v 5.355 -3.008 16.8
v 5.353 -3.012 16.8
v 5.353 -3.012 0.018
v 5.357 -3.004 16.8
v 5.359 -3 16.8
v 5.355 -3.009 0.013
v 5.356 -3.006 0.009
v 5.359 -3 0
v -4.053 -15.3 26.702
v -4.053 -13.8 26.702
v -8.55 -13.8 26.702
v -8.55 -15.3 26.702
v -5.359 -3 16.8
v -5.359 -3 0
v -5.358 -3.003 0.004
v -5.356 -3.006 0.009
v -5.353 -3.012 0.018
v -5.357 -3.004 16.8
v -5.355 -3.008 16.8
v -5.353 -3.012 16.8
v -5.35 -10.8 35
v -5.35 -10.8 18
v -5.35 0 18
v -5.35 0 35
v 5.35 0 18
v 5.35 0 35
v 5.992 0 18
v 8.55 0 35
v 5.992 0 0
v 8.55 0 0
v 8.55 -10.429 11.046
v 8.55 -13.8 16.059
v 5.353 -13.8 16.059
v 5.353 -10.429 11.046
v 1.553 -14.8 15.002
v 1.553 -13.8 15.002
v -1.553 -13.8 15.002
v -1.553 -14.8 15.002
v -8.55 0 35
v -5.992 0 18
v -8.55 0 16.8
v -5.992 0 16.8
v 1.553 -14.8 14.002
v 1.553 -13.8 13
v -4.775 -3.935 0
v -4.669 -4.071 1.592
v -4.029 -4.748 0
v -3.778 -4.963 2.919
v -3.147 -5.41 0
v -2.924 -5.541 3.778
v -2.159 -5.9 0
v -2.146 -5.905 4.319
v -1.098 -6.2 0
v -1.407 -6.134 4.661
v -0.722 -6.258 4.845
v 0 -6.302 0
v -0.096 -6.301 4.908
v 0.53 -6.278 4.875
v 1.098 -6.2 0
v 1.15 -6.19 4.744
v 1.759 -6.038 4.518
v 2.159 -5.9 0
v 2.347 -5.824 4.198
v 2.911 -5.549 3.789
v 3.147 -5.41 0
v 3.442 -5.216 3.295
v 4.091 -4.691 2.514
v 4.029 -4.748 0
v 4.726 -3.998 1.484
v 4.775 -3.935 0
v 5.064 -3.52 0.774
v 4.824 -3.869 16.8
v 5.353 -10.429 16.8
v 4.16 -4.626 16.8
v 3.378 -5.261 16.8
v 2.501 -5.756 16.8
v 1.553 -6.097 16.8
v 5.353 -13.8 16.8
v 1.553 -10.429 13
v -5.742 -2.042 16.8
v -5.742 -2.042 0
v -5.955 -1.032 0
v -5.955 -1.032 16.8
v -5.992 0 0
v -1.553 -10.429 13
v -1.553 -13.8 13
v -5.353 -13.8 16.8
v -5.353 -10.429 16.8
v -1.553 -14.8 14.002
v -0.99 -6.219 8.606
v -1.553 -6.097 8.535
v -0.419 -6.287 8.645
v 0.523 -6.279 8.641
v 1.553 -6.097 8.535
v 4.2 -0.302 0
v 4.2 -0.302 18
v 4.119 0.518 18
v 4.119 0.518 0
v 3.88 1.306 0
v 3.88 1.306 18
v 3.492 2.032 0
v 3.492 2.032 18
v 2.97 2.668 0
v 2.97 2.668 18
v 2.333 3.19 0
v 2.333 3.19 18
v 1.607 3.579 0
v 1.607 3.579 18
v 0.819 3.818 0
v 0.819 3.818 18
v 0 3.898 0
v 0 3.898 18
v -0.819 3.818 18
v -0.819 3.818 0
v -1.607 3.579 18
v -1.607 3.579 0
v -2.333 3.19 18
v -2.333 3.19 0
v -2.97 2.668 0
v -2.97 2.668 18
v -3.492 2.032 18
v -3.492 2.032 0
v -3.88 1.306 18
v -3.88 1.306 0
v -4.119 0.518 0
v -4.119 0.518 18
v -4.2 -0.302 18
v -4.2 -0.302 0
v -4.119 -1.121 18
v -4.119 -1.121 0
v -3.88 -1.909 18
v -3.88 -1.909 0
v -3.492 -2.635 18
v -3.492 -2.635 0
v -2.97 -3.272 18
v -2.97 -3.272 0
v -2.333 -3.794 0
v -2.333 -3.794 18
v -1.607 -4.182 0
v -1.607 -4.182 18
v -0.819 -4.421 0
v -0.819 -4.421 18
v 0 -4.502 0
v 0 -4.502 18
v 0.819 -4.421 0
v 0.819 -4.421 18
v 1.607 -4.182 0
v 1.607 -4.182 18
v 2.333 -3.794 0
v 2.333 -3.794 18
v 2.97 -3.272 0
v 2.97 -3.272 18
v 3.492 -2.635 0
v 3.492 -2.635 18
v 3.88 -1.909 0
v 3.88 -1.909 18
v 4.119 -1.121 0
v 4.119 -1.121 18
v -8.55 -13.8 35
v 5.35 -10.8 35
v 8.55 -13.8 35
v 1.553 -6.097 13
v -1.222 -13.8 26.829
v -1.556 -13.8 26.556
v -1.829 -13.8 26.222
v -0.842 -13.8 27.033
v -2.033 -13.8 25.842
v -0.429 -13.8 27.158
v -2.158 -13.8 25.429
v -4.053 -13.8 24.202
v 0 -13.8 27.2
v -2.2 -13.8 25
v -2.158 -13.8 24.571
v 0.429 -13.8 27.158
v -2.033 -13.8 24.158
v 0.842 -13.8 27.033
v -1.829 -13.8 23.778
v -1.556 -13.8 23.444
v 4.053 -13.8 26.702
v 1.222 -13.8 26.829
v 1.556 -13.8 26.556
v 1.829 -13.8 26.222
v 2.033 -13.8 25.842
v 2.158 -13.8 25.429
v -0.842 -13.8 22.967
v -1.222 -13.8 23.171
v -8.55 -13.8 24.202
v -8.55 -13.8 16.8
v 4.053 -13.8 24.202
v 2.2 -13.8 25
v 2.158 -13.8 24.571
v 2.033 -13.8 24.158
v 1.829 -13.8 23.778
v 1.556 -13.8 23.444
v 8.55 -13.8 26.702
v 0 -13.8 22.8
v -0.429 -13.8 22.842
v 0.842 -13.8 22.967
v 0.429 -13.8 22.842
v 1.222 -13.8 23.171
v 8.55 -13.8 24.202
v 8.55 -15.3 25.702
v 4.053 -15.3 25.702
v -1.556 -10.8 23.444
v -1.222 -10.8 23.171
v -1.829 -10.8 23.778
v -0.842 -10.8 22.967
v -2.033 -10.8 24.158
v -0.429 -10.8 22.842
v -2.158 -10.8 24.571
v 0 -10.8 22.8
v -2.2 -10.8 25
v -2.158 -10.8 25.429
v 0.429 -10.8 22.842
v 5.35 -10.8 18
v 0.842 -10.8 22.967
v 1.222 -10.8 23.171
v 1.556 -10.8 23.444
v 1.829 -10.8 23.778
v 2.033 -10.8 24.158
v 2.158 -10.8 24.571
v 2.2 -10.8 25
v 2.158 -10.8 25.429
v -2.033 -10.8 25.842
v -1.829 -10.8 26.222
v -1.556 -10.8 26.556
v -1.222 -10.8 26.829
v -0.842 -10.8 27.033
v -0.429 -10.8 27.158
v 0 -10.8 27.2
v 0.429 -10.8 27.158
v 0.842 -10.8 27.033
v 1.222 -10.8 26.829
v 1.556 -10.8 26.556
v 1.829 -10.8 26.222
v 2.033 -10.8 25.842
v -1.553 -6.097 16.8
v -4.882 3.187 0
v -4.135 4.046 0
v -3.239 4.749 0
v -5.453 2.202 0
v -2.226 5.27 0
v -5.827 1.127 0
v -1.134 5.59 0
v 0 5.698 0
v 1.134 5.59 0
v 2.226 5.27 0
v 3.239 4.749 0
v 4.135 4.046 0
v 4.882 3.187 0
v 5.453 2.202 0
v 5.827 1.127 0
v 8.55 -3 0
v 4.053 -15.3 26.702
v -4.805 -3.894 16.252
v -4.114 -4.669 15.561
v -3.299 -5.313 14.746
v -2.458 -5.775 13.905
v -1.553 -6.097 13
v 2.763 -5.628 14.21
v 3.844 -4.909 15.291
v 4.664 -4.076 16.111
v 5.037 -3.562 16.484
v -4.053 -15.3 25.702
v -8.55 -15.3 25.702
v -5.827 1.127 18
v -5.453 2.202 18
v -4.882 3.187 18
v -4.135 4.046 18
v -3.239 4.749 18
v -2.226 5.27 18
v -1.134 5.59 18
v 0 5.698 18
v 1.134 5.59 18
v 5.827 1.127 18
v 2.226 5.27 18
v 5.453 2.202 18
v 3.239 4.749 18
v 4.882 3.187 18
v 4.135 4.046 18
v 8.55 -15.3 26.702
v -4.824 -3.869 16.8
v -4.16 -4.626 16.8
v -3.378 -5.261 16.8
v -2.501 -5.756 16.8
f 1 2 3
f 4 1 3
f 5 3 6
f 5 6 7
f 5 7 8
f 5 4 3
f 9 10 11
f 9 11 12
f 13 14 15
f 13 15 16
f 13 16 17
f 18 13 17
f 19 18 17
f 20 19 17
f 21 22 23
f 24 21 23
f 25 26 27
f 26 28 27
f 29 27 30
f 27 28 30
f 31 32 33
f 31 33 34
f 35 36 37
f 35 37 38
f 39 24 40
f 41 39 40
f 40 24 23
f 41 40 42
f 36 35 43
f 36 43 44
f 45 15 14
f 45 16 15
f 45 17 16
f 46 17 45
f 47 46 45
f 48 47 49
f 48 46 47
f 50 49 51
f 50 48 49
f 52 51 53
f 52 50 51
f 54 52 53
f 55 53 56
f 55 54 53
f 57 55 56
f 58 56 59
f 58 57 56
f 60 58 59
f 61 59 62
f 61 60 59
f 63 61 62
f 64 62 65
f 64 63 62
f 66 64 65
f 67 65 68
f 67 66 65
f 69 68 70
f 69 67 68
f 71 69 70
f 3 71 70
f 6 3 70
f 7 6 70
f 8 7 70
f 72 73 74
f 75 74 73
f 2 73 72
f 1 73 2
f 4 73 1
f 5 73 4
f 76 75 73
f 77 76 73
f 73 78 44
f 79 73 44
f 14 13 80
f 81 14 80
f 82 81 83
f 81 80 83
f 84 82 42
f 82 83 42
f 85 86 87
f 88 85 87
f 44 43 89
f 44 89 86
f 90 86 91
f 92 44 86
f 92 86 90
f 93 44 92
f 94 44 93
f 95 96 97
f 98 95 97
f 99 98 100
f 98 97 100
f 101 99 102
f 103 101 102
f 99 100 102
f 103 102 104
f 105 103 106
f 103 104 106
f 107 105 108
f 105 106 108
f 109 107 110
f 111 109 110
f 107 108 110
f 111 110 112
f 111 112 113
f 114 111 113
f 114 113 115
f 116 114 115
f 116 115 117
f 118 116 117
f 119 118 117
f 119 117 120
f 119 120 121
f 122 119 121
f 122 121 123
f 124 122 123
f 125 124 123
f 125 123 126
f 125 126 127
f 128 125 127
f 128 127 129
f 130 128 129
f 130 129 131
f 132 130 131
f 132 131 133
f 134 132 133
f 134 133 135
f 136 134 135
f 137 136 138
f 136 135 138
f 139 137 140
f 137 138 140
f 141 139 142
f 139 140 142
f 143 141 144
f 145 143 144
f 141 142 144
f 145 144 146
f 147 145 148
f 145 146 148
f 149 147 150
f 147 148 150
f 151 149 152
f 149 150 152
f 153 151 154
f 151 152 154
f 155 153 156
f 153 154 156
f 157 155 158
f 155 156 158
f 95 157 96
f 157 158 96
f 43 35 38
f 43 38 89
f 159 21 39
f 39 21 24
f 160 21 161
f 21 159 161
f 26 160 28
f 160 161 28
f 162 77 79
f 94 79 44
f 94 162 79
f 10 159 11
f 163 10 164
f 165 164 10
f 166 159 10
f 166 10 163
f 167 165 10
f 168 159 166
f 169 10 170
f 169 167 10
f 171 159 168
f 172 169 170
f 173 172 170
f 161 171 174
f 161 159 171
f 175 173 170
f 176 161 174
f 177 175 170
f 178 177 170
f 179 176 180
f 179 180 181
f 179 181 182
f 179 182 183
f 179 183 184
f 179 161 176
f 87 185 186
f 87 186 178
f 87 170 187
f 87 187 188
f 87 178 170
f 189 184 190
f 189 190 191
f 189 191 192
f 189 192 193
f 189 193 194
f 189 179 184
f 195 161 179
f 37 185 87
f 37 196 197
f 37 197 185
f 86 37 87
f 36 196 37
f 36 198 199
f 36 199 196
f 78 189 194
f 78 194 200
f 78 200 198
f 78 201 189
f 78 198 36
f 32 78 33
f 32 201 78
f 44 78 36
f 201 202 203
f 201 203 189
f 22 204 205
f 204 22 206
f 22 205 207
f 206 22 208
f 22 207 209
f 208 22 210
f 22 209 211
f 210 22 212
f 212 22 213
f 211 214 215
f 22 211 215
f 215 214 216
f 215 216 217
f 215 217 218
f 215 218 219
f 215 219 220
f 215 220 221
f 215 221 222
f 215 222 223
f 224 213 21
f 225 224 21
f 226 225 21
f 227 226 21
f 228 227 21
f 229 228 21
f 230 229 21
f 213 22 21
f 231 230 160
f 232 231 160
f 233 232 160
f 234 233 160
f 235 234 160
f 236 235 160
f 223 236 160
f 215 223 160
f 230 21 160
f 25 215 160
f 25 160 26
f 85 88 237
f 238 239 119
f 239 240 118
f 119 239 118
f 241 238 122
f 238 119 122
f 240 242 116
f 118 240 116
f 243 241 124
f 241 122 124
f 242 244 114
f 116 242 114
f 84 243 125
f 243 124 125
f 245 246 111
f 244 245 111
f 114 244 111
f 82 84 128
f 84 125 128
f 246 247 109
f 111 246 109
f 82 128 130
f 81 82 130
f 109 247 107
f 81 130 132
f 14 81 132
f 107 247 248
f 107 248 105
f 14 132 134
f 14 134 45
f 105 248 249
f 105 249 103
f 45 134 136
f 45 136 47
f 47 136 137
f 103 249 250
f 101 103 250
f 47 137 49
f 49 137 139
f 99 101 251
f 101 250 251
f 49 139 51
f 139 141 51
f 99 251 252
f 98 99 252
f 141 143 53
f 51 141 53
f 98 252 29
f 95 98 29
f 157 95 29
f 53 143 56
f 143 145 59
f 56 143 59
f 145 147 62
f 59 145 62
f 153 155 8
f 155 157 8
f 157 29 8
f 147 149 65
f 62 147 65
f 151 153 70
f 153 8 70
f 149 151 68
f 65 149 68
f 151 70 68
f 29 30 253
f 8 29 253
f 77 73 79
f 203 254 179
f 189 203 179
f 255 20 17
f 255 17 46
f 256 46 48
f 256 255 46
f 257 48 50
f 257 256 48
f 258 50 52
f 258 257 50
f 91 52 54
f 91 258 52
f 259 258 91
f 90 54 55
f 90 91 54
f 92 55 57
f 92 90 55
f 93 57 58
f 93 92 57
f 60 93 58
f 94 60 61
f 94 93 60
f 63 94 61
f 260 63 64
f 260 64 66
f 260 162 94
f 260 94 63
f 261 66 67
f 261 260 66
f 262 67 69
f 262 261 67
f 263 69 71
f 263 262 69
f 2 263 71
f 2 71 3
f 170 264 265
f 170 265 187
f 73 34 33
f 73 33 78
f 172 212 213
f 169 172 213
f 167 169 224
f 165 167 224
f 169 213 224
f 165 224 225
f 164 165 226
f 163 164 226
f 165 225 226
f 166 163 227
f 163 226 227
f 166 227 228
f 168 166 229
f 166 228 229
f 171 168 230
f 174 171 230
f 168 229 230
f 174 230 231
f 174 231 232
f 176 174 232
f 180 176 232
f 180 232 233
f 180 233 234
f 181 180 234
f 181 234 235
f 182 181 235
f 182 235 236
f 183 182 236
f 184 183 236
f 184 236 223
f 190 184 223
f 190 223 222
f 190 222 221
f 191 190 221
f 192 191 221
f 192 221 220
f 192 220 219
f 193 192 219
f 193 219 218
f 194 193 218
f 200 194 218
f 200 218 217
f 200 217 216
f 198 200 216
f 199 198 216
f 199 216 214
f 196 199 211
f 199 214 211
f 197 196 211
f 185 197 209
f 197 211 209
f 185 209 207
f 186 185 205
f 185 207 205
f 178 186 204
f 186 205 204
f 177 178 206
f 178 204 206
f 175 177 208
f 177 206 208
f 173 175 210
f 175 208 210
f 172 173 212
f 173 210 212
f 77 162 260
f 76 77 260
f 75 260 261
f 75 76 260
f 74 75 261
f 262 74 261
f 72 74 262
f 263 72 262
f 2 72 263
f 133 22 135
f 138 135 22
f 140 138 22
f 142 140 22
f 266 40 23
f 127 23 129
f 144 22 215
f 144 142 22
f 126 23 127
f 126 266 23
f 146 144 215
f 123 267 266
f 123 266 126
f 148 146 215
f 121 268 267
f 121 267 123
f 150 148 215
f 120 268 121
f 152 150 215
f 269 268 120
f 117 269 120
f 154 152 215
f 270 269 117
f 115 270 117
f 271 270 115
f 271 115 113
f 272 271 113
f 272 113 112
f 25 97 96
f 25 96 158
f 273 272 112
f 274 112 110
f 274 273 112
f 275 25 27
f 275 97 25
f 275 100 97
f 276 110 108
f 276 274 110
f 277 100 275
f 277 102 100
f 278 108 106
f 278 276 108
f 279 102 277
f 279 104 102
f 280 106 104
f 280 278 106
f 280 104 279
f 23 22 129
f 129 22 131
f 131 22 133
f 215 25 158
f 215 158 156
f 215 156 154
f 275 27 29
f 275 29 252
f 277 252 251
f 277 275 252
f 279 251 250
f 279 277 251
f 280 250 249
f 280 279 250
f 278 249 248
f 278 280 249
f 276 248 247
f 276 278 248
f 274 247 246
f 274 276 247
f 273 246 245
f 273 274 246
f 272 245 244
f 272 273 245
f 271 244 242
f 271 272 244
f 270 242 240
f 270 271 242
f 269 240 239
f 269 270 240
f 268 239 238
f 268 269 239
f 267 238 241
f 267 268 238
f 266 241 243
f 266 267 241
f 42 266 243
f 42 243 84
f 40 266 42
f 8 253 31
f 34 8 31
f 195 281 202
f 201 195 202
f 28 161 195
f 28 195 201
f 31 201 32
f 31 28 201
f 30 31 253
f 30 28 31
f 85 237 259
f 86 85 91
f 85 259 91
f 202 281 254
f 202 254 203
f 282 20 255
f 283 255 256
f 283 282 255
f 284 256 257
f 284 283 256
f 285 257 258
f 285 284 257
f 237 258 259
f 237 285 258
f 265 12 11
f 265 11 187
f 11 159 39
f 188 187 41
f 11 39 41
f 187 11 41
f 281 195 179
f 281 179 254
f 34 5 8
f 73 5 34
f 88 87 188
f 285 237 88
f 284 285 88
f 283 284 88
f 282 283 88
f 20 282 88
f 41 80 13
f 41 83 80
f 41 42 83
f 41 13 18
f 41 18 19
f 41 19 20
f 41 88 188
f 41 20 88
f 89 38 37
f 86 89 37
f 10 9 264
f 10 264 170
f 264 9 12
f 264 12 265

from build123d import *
from build123d.topology import SkipClean

# Parameters (mm, degrees)
BOSS_EXTRUDE1_DEPTH     = 8.55
SKETCH2_W               = 10.7
SKETCH2_H               = 10.8
CUT_EXTRUDE1_DEPTH      = 17
SKETCH3_R               = 6
BOSS_EXTRUDE2_DEPTH     = 18
SKETCH4_R               = 4.2
CUT_EXTRUDE2_DEPTH      = 25.239275979
BOSS_EXTRUDE5_DEPTH     = 17.1
SKETCH7_R               = 2.2
CUT_EXTRUDE3_DEPTH      = 40.626944786
CUT_EXTRUDE4_REACH      = 33.94
SKETCH10_W              = 8.106
SKETCH10_H              = 1.5
SKETCH11_W              = 6.997
SKETCH11_H              = 1
CUT_EXTRUDE5_DEPTH      = 27.591587091
CUT_EXTRUDE6_REACH      = 42.967
CUT_EXTRUDE6_END_RADIUS = 6
CUT_EXTRUDE7_START      = -16.8
CUT_EXTRUDE7_DEPTH      = 16.8
BOSS_EXTRUDE6_DEPTH     = 1.553
BOSS_EXTRUDE7_REACH     = 36.128
CUT_EXTRUDE8_START      = -16.8
CUT_EXTRUDE8_DEPTH      = 16.8
CUT_EXTRUDE9_REACH      = 43.851


with BuildPart() as part:
    # Sketch1 → Boss-Extrude1 (new, symmetric)
    with BuildSketch(Plane(origin=(0, 0, 0), x_dir=(0, 0, -1), z_dir=(1, 0, 0))):
        Polygon((0, 0), (0, -3), (-16.0587, -13.8), (-35, -13.8), (-35, 0), align=None)
    extrude(amount=BOSS_EXTRUDE1_DEPTH, both=True)

    # Sketch2 → Cut-Extrude1 (cut)
    with BuildSketch(Plane.XY.offset(35)):
        with Locations((0, -5.4)):
            Rectangle(SKETCH2_W, SKETCH2_H)
    extrude(amount=-CUT_EXTRUDE1_DEPTH, mode=Mode.SUBTRACT)

    # Sketch3 → Boss-Extrude2 (add, through all)
    with BuildSketch(Plane.XY.offset(18)):
        with Locations((0, -0.30175)):
            Circle(SKETCH3_R)
    extrude(amount=-BOSS_EXTRUDE2_DEPTH)

    # Sketch4 → Cut-Extrude2 (cut, through all)
    with BuildSketch(Plane.XY.offset(18)):
        with Locations((0, -0.30175)):
            Circle(SKETCH4_R)
    extrude(amount=-CUT_EXTRUDE2_DEPTH, mode=Mode.SUBTRACT)

    # Sketch8 → Boss-Extrude5 (add, through all)
    with BuildSketch(Plane(origin=(8.55, 0, 0), x_dir=(0, 0, -1), z_dir=(1, 0, 0))):
        Polygon((-26.702, -13.8), (-26.702, -15.3), (-25.702, -15.3), (-24.202, -13.8), align=None)
        Polygon((-16.0587, -13.8), (-15.002, -13.8), (-15.002, -14.8), (-14.002, -14.8), (-13, -13.8), (-11.045997115, -10.428793666), align=None)
    extrude(amount=-BOSS_EXTRUDE5_DEPTH)

    # Sketch7 → Cut-Extrude3 (cut, through all)
    with BuildSketch(Plane(origin=(0, -10.8, 0), x_dir=(1, 0, 0), z_dir=(0, 1, 0))):
        with Locations(Location((0, -25, 0), (0, 0, 180))):
            Circle(SKETCH7_R)
    extrude(amount=-CUT_EXTRUDE3_DEPTH, mode=Mode.SUBTRACT)

    # Cut-Extrude4: up to this plane
    cut_extrude4_end = Plane(origin=(-8.55, -15.3, 25.702), z_dir=(0, -0.7071067811865471, -0.707106781186548))
    # Sketch10 → Cut-Extrude4 (cut, up to the surface)
    with BuildSketch(Plane.XY.offset(26.702), mode=Mode.PRIVATE) as cut_extrude4_sk1:
        with Locations((0, -14.55)):
            Rectangle(SKETCH10_W, SKETCH10_H)
    cut_extrude4_tool1 = split(extrude(cut_extrude4_sk1.sketch, amount=-CUT_EXTRUDE4_REACH, mode=Mode.PRIVATE), bisect_by=cut_extrude4_end, keep=Keep.BOTH, mode=Mode.PRIVATE)
    add(cut_extrude4_tool1.solids().sort_by_distance((0, -14.55, 26.702))[0], mode=Mode.SUBTRACT)

    # Sketch11 → Cut-Extrude5 (cut, through all)
    with BuildSketch(Plane.XY.offset(15.002)):
        with Locations((-5.0515, -14.3)):
            Rectangle(SKETCH11_W, SKETCH11_H)
        with Locations((5.0515, -14.3)):
            Rectangle(SKETCH11_W, SKETCH11_H)
    extrude(amount=-CUT_EXTRUDE5_DEPTH, mode=Mode.SUBTRACT)

    # Cut-Extrude6: up to this cylinder (the profile starts outside it)
    cut_extrude6_end = Plane(origin=(0, -0.30175, 7.230062), z_dir=(0, 0, 1)) * Cylinder(CUT_EXTRUDE6_END_RADIUS, 98.934, mode=Mode.PRIVATE)
    # Sketch12 → Cut-Extrude6 (cut, up to the surface)
    with BuildSketch(Plane.XZ.offset(13.8), mode=Mode.PRIVATE) as cut_extrude6_sk1:
        Polygon((-1.553, 13), (-5.353, 16.8), (-5.353, 0), (5.353, 0), (5.353, 16.8), (1.553, 13), align=None)
    cut_extrude6_tool1 = extrude(cut_extrude6_sk1.sketch, amount=-CUT_EXTRUDE6_REACH, mode=Mode.PRIVATE) - cut_extrude6_end
    add(cut_extrude6_tool1.solids().sort_by_distance((0, -13.8, 7.230062))[0], mode=Mode.SUBTRACT)

    # Sketch13 → Cut-Extrude7 (cut)
    with SkipClean():  # the faces are left unmerged after this step: merging them gives an invalid solid
        with BuildSketch(Plane(origin=(0, 0, 0), x_dir=(-1, 0, 0), z_dir=(0, 0, -1)).offset(CUT_EXTRUDE7_START)):
            with BuildLine():
                Line((-5.359052802, -3), (-5.353, -10.428793666))
                Line((-5.353, -10.428793666), (5.353, -10.428793666))
                Line((5.353, -10.428793666), (5.359052802, -3))
                ThreePointArc((5.359052802, -3), (0, -6.30175), (-5.359052802, -3))
            make_face()
        extrude(amount=CUT_EXTRUDE7_DEPTH, mode=Mode.SUBTRACT)

    # Sketch14 → Boss-Extrude6 (add, symmetric)
    with SkipClean():  # the faces are left unmerged after this step: merging them gives an invalid solid
        with BuildSketch(Plane(origin=(0, 0, 0), x_dir=(0, 0, -1), z_dir=(1, 0, 0))):
            Polygon((-13, -13.8), (-8.073269662, -5.3), (-16.8, -5.3), (-16.8, -13.8), align=None)
        extrude(amount=BOSS_EXTRUDE6_DEPTH, both=True)

    # Sketch15 → Boss-Extrude7 (add, up to next)
    with BuildSketch(Plane(origin=(-7.436377386, -6.523873454, 7.436377386), x_dir=(-0.7993387140757535, 0.3962687040508023, -0.4516953999872244), z_dir=(0.6008807037838052, 0.5271477588310114, -0.6008807037838052)), mode=Mode.PRIVATE) as boss_extrude7_sk1:
        Polygon((-11.246017774, 0.733681451), (-11.246017774, 6.495798547), (-15.999947407, 3.239704803), align=None)
    boss_extrude7_tool1 = extrude(boss_extrude7_sk1.sketch, amount=-BOSS_EXTRUDE7_REACH, mode=Mode.PRIVATE) - part.part
    boss_extrude7 = boss_extrude7_tool1.solids().sort_by_distance((2.819667, -8.984956, 15.533333))[0]
    add(boss_extrude7)

    # Mirror1: Boss-Extrude7 across plane
    with SkipClean():  # the faces are left unmerged after this step: merging them gives an invalid solid
        add(boss_extrude7.mirror(Plane(origin=(0, 0, 0), x_dir=(0, 0, 1), z_dir=(1, 0, 0))))

    # Sketch16 → Cut-Extrude8 (cut)
    with SkipClean():  # the faces are left unmerged after this step: merging them gives an invalid solid
        with BuildSketch(Plane(origin=(0, 0, 0), x_dir=(-1, 0, 0), z_dir=(0, 0, -1)).offset(CUT_EXTRUDE8_START)):
            with BuildLine():
                Line((5.992407441, 0), (8.55, 0))
                Line((8.55, 0), (8.55, -13.8))
                Line((8.55, -13.8), (5.353, -13.8))
                Line((5.353, -13.8), (5.353, -3.011988181))
                ThreePointArc((5.353, -3.011988181), (5.869206565, -1.547709188), (5.992407441, 0))
            make_face()
        extrude(amount=CUT_EXTRUDE8_DEPTH, mode=Mode.SUBTRACT)

    # Sketch17 → Cut-Extrude9 (cut, up to next)
    with BuildSketch(Plane(origin=(8.55, 0, 0), x_dir=(0, 0, -1), z_dir=(1, 0, 0)), mode=Mode.PRIVATE) as cut_extrude9_sk1:
        Polygon((-11.045997115, -10.428793666), (-13, -13.8), (-16.0587, -13.8), align=None)
    cut_extrude9_tool1 = extrude(cut_extrude9_sk1.sketch, amount=-CUT_EXTRUDE9_REACH, mode=Mode.PRIVATE) & part.part
    add(cut_extrude9_tool1.solids().sort_by_distance((8.55, -12.676265, 13.368232))[0], mode=Mode.SUBTRACT)


solid = part.part
